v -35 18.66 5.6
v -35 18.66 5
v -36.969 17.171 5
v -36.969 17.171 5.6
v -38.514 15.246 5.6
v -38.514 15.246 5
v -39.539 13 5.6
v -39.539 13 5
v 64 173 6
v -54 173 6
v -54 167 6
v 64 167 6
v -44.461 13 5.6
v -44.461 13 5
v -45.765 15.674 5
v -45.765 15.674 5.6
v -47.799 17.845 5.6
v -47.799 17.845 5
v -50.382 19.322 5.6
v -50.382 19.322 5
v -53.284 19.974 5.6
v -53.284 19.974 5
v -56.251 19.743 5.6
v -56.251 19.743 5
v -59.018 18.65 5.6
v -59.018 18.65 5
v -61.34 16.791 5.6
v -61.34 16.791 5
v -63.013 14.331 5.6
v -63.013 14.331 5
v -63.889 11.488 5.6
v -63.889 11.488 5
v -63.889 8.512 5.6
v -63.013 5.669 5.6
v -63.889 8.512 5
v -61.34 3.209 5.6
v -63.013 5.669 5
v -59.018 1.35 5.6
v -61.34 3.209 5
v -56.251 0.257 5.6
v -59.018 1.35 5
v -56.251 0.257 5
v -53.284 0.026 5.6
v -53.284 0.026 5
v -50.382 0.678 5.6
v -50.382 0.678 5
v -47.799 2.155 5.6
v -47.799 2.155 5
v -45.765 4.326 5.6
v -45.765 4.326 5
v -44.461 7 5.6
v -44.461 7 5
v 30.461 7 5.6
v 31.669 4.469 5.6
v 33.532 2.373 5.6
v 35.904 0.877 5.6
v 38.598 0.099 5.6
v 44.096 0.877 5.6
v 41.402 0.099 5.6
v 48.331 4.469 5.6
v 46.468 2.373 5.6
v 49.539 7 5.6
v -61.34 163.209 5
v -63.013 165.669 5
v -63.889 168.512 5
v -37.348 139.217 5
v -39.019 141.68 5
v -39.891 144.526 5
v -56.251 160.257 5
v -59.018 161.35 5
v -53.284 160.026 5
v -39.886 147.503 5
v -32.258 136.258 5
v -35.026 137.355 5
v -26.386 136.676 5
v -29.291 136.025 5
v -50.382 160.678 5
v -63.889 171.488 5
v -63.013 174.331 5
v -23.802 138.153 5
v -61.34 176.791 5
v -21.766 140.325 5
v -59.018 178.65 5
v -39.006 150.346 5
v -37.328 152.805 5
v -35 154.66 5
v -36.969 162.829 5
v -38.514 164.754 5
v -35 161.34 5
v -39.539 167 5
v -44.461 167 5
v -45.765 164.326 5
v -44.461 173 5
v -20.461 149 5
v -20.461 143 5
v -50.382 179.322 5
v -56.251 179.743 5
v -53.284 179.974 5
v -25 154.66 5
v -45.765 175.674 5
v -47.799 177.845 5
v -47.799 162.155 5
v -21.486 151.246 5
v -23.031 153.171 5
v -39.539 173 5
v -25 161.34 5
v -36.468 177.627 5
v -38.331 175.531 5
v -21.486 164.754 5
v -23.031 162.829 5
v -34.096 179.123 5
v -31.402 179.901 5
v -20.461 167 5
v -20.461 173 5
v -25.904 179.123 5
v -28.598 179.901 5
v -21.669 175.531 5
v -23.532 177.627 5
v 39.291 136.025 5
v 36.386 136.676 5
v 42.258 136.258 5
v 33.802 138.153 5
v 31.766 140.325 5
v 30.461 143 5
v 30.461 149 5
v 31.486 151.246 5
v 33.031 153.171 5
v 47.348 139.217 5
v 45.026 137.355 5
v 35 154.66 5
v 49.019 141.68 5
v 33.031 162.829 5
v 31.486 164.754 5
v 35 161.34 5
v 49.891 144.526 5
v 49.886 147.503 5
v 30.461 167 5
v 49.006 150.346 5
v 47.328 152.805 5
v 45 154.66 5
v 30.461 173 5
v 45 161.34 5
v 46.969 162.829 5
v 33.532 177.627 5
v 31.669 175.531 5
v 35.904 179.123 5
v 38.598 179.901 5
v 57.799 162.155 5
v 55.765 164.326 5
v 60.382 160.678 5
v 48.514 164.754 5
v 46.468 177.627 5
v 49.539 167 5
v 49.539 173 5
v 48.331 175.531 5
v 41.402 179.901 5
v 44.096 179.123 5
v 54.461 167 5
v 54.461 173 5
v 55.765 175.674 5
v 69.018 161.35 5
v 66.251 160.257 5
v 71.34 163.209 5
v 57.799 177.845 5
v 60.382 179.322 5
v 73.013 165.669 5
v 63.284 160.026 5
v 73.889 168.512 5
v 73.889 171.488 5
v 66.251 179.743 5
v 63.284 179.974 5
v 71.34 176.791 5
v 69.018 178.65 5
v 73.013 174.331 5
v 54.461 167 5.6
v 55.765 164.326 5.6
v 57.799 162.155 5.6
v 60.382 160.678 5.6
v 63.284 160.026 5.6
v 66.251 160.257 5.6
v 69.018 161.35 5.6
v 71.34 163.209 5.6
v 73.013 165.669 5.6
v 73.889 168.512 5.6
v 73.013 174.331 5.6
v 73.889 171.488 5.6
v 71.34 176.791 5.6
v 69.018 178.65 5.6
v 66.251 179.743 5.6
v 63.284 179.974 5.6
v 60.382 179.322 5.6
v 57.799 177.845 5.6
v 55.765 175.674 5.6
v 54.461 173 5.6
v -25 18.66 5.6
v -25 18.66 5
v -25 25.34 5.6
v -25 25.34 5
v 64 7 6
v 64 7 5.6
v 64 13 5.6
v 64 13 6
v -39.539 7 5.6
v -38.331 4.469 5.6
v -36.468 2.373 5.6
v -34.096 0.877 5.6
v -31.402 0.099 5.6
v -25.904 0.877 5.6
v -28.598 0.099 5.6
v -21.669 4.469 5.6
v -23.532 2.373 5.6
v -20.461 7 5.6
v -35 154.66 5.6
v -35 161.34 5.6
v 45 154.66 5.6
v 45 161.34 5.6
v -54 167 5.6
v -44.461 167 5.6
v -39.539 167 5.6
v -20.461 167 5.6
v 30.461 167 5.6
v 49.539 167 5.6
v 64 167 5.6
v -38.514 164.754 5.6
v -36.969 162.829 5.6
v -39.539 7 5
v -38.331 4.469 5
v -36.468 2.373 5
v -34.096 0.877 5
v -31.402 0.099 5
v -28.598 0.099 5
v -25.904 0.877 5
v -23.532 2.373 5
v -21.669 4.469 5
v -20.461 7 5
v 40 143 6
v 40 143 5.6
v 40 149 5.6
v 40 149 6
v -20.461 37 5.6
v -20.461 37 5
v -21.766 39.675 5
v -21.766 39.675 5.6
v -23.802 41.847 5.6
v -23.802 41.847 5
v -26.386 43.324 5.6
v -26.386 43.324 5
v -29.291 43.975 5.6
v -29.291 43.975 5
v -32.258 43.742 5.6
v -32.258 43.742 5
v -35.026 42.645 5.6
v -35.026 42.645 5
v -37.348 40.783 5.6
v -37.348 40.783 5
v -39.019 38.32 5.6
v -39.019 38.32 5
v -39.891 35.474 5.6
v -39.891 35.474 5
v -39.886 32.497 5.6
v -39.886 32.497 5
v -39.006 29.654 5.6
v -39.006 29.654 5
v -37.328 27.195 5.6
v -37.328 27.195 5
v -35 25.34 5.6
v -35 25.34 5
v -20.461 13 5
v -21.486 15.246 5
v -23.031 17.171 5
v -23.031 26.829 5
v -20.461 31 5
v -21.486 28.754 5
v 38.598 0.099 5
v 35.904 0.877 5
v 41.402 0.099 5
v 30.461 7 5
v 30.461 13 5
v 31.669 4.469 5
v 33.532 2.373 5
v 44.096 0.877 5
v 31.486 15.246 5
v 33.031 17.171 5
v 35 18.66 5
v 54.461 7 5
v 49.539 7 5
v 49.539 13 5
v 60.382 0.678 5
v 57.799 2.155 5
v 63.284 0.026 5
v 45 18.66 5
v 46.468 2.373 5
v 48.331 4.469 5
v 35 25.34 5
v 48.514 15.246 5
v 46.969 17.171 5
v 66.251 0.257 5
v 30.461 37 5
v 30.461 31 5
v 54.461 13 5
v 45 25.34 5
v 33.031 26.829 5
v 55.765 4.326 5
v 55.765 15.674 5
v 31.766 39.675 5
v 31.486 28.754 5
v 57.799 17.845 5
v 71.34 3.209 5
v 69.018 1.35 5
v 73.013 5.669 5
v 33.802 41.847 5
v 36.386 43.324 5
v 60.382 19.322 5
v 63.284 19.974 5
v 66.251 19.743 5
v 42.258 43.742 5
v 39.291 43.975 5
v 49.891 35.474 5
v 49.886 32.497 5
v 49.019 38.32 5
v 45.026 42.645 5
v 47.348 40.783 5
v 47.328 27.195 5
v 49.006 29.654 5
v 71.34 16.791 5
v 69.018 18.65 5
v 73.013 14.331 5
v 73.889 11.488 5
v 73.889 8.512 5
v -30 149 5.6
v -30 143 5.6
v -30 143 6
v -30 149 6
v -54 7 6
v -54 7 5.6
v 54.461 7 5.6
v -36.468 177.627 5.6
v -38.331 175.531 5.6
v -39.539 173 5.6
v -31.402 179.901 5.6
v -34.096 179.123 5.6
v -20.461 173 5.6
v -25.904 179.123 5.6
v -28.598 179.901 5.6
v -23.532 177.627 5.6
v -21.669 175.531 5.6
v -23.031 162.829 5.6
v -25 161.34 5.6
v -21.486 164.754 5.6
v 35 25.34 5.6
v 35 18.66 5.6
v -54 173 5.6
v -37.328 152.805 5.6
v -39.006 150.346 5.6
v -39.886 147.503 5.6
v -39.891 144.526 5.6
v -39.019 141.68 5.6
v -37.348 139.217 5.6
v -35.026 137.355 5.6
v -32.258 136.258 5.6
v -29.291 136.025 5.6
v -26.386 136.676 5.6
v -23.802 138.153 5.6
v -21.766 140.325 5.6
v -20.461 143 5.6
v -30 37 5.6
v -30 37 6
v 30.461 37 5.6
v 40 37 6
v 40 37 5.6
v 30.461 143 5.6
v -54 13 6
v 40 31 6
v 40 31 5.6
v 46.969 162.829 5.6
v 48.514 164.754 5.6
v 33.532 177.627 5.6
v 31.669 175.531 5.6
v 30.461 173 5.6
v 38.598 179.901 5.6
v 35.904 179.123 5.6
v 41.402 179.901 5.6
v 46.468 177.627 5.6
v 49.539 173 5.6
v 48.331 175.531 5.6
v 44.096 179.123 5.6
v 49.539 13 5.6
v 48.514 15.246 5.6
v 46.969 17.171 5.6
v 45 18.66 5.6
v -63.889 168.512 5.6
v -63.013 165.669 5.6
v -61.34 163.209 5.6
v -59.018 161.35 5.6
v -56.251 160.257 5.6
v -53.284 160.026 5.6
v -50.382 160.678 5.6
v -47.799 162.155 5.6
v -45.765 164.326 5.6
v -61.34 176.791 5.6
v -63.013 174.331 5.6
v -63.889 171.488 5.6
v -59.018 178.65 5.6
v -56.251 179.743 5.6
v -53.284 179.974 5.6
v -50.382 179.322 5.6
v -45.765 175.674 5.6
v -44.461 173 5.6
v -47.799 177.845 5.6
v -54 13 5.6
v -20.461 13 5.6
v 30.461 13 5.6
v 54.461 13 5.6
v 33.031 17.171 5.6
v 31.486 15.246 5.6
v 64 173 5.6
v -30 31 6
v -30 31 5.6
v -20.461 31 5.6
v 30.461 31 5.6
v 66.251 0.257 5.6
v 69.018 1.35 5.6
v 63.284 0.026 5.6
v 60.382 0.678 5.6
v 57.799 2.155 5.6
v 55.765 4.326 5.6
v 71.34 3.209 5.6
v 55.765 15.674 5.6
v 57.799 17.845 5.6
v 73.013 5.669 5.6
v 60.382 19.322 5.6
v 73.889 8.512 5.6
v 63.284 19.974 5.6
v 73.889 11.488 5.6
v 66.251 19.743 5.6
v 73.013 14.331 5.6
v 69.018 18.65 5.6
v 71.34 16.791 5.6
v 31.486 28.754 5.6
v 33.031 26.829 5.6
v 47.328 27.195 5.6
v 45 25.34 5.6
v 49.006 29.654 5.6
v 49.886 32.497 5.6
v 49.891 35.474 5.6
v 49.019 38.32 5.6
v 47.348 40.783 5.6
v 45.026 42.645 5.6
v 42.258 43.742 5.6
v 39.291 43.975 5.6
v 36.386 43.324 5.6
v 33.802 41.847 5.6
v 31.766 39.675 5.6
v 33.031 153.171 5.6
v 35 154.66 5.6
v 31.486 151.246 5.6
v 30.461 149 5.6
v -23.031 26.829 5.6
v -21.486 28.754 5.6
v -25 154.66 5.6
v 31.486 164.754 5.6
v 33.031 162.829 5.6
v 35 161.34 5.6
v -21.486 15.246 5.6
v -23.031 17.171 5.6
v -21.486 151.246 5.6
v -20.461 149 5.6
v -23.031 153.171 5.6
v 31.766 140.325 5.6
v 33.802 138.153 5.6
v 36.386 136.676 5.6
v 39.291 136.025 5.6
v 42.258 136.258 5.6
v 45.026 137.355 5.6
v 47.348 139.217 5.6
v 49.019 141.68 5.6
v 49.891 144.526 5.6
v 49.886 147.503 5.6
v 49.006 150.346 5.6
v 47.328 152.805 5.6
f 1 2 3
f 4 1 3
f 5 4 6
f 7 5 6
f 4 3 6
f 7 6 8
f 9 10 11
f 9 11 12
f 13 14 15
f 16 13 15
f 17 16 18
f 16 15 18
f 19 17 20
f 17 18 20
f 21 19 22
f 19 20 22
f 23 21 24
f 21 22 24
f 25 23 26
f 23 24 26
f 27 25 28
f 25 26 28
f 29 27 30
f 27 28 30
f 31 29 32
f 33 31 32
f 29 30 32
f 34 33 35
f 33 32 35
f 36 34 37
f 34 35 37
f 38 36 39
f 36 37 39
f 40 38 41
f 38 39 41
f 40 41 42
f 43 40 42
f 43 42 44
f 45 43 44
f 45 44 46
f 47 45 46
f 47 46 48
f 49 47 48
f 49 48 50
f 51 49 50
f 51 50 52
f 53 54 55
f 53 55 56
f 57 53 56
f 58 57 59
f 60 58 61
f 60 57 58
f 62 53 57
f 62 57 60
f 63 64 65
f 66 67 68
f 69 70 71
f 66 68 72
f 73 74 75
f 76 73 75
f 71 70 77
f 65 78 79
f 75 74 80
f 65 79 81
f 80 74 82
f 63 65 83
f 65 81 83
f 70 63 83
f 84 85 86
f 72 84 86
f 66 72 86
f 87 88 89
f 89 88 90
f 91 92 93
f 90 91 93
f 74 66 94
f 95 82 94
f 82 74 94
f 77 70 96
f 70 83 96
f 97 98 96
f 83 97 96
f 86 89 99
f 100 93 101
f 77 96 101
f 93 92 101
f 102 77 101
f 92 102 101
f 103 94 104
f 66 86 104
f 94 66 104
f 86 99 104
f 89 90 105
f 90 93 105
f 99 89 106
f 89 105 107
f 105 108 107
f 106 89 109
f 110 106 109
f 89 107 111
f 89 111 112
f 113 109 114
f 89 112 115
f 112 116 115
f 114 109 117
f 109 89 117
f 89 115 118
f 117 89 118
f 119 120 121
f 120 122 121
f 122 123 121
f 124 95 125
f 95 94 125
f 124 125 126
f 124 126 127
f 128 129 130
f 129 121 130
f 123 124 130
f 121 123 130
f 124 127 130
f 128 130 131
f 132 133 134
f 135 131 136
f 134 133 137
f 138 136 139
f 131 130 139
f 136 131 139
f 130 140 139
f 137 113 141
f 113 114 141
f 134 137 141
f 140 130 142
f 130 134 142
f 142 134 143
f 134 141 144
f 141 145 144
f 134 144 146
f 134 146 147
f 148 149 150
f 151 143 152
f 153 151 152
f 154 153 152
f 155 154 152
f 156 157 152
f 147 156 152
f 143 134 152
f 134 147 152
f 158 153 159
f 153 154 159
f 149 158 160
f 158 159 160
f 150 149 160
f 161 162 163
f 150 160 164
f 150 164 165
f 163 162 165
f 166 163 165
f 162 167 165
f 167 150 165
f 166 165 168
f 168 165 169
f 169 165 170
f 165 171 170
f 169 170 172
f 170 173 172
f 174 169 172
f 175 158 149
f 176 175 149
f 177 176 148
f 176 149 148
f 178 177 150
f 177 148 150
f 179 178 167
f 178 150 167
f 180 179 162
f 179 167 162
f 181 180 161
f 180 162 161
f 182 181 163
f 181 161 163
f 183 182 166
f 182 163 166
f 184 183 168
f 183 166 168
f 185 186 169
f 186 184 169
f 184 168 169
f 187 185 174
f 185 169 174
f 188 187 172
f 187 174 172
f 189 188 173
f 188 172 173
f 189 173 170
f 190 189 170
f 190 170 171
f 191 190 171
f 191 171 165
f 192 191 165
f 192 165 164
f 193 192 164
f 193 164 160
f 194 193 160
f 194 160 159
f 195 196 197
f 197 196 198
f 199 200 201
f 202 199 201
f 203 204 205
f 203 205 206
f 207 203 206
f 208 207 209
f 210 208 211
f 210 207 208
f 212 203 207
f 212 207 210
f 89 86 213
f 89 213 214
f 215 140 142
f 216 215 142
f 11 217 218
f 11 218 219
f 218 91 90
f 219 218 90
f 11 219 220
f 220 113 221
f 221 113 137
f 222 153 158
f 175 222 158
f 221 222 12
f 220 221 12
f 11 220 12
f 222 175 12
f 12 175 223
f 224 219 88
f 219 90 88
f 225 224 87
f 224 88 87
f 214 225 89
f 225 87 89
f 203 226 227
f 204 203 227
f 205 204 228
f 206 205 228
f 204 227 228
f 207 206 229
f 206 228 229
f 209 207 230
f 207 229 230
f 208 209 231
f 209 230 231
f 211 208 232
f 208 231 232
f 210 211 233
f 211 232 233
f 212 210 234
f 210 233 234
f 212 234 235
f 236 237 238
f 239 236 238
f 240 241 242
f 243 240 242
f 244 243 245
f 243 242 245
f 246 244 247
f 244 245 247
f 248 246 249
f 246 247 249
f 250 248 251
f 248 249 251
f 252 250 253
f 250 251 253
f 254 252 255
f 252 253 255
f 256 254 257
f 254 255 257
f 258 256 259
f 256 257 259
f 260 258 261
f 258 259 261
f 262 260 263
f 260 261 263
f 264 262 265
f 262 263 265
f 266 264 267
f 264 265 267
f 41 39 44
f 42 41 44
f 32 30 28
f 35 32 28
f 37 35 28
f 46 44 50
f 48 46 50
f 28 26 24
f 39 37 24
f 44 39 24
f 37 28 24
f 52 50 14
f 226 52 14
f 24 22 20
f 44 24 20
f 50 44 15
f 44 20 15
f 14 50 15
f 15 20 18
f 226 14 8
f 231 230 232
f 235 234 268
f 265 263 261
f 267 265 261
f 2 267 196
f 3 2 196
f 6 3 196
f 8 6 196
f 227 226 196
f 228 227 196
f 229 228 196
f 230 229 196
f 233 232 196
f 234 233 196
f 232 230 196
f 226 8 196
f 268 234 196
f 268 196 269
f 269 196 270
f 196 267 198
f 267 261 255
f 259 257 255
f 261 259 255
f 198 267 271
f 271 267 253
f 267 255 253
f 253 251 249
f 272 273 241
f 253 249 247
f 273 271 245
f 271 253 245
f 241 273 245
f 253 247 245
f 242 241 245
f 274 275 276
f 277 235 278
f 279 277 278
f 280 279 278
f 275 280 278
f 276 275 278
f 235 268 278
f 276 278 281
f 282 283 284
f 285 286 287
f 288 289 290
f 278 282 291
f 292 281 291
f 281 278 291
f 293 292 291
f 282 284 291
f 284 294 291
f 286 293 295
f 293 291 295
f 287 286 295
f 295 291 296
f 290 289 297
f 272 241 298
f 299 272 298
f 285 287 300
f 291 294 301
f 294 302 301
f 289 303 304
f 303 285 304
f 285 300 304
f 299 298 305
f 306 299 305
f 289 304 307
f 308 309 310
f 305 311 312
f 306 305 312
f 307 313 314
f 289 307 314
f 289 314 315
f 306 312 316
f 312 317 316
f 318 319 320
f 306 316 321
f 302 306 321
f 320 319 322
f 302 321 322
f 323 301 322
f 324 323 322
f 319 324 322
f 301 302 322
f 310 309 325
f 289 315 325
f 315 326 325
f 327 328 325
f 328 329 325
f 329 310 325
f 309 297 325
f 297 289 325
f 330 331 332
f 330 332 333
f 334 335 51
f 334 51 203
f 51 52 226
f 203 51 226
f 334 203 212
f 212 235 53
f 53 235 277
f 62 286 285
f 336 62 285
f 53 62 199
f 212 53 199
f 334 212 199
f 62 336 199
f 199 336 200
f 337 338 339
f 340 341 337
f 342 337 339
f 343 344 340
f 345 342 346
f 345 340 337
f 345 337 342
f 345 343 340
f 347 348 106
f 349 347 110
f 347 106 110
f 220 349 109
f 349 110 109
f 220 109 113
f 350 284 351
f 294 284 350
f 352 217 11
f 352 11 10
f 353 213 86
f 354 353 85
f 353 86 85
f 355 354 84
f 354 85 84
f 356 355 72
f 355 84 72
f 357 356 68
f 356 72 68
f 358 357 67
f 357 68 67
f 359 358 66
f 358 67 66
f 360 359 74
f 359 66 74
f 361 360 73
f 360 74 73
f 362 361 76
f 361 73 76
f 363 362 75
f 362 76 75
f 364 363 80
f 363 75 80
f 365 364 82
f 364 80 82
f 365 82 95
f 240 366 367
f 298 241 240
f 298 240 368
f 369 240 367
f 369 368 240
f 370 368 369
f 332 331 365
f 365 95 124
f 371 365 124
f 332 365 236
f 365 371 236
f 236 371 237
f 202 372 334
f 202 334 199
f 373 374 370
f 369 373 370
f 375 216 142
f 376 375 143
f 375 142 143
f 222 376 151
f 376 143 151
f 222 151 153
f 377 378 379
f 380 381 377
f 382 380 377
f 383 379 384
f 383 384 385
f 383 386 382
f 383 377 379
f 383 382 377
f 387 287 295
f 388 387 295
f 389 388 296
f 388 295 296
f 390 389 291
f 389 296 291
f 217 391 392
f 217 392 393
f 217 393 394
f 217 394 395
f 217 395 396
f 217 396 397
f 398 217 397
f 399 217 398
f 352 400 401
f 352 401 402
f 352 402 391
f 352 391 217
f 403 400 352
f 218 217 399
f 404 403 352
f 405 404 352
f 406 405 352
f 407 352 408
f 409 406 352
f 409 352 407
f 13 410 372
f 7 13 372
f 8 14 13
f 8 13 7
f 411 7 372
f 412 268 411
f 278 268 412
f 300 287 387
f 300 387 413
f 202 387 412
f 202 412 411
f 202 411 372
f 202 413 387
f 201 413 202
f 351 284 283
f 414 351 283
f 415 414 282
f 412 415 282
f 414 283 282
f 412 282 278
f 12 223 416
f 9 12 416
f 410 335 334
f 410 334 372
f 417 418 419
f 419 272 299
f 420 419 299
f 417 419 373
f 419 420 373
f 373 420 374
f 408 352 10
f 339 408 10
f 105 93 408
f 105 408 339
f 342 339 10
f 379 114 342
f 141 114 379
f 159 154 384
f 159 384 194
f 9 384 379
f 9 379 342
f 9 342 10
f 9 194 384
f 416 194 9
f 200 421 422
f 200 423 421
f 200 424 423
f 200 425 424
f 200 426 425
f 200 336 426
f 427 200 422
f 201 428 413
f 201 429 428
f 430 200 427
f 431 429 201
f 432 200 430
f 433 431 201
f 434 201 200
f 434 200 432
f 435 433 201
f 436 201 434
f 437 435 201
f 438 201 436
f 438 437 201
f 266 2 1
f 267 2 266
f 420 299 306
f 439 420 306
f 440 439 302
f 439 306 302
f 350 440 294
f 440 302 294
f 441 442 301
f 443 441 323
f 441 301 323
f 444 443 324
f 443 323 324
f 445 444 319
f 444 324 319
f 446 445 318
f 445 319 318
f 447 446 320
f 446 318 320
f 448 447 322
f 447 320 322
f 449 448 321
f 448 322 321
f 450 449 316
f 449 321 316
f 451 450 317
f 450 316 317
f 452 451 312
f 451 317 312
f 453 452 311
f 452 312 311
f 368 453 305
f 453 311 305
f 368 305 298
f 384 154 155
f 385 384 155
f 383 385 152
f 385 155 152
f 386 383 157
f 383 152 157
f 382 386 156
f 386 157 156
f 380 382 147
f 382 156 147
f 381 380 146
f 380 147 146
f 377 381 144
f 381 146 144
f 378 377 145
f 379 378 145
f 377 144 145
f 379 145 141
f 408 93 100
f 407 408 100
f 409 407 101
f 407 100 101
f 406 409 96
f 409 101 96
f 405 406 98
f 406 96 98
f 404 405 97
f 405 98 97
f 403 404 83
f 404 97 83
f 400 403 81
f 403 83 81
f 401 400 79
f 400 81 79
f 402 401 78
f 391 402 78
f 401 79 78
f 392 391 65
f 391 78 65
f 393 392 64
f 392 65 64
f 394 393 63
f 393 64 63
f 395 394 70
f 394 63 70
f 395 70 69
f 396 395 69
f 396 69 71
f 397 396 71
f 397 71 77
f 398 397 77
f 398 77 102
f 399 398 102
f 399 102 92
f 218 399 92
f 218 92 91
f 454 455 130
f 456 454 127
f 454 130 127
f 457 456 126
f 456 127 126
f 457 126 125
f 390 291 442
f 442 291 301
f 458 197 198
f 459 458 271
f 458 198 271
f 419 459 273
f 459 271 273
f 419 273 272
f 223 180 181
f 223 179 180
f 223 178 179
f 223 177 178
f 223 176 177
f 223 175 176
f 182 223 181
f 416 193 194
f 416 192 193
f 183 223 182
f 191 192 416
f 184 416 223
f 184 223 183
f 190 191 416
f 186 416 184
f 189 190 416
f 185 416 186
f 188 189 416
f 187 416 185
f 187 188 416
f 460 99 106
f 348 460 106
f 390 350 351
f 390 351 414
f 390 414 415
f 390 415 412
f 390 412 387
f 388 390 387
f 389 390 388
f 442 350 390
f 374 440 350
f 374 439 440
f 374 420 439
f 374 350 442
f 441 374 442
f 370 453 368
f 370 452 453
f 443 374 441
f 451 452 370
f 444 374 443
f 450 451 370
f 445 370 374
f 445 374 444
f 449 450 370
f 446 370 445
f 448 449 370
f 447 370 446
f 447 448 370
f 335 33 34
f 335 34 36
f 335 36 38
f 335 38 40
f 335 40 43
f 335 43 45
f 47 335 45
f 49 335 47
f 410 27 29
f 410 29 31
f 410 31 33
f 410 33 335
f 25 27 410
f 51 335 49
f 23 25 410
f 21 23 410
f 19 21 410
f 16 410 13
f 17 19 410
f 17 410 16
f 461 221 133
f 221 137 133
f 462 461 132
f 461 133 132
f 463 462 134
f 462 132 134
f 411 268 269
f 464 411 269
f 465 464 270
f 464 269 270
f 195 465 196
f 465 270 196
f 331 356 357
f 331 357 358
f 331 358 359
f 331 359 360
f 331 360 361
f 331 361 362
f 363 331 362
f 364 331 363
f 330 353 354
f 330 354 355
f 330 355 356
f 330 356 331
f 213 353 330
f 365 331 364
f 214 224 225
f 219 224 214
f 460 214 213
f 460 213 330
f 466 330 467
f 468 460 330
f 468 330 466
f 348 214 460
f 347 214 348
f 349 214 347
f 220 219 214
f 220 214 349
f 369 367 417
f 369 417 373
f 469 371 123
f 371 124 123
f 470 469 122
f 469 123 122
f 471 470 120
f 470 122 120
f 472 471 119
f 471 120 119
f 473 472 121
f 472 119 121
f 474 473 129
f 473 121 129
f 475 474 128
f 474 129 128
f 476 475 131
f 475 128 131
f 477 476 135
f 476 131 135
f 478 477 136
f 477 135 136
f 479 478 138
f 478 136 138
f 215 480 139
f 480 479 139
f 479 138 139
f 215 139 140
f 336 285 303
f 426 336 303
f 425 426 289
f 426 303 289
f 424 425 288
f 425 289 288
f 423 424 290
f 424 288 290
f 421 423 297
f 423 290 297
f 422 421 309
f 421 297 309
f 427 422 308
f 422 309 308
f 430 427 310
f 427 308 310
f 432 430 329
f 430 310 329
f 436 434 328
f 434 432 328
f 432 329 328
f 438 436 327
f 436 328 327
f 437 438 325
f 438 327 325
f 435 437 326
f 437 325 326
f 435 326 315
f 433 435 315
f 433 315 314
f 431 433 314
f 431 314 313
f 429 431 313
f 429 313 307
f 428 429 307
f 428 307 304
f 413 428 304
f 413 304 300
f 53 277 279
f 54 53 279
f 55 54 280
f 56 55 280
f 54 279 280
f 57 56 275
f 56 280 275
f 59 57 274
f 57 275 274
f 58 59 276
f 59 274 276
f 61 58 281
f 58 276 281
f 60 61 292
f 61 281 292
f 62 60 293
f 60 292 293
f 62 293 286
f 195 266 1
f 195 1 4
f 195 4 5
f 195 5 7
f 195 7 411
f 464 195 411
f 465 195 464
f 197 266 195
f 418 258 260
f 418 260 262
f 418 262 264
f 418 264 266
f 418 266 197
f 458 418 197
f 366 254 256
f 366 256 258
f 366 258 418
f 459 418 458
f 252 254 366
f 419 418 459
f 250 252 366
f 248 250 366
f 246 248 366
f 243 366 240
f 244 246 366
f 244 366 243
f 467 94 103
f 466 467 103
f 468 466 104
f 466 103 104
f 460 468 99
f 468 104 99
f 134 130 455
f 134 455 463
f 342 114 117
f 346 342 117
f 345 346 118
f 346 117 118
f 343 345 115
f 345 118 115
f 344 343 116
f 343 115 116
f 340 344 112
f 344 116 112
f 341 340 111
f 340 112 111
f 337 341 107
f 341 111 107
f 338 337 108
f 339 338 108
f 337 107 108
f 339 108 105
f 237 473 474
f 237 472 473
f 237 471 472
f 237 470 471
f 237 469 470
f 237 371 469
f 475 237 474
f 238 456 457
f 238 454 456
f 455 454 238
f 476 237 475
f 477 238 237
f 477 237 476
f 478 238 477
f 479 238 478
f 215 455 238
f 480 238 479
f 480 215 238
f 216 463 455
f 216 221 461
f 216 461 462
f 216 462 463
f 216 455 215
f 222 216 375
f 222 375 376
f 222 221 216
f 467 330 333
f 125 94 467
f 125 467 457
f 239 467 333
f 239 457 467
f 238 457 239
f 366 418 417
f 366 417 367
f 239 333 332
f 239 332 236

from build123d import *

# Parameters (mm, degrees)
CYLINDER018_R     = 10
CYLINDER018_DEPTH = 0.6
CYLINDER019_R     = 10
CYLINDER019_DEPTH = 0.6
CYLINDER020_R     = 10
CYLINDER020_DEPTH = 0.6
BOX015_W          = 70
BOX015_H          = 6
BOX015_DEPTH      = 1
BOX016_W          = 70
BOX016_H          = 6
BOX016_DEPTH      = 1
CYLINDER025_R     = 10
CYLINDER025_DEPTH = 0.6
CYLINDER026_R     = 10
CYLINDER026_DEPTH = 0.6
CYLINDER027_R     = 10
CYLINDER027_DEPTH = 0.6
CYLINDER028_R     = 10
CYLINDER028_DEPTH = 0.6
CYLINDER029_R     = 10
CYLINDER029_DEPTH = 0.6
CYLINDER030_R     = 10
CYLINDER030_DEPTH = 0.6
CYLINDER031_R     = 10
CYLINDER031_DEPTH = 0.6
CYLINDER032_R     = 10
CYLINDER032_DEPTH = 0.6
BOX019_W          = 118
BOX019_H          = 6
BOX019_DEPTH      = 1
BOX020_W          = 118
BOX020_H          = 6
BOX020_DEPTH      = 1
BOX021_W          = 10
BOX021_H          = 10
BOX021_DEPTH      = 0.6
BOX022_W          = 10
BOX022_H          = 10
BOX022_DEPTH      = 0.6
BOX023_W          = 10
BOX023_H          = 10
BOX023_DEPTH      = 0.6
BOX024_W          = 10
BOX024_H          = 10
BOX024_DEPTH      = 0.6
CYLINDER017_R     = 10
CYLINDER017_DEPTH = 0.6


with BuildPart() as cylinder018:
    # Cylinder018 → Cylinder018 (new body)
    with BuildSketch(Plane(origin=(64, 10, 5), x_dir=(1, 0, 0), z_dir=(0, 0, 1))):
        Circle(CYLINDER018_R)
    extrude(amount=CYLINDER018_DEPTH)


with BuildPart() as cylinder019:
    # Cylinder019 → Cylinder019 (new body)
    with BuildSketch(Plane(origin=(-54, 170, 5), x_dir=(1, 0, 0), z_dir=(0, 0, 1))):
        Circle(CYLINDER019_R)
    extrude(amount=CYLINDER019_DEPTH)


with BuildPart() as cylinder020:
    # Cylinder020 → Cylinder020 (new body)
    with BuildSketch(Plane(origin=(40, 146, 5), x_dir=(1, 0, 0), z_dir=(0, 0, 1))):
        Circle(CYLINDER020_R)
    extrude(amount=CYLINDER020_DEPTH)


with BuildPart() as cube015:
    # Box015 → Box015 (new body)
    with BuildSketch(Plane(origin=(-30, 31, 5), x_dir=(1, 0, 0), z_dir=(0, 0, 1))):
        with Locations((35, 3)):
            Rectangle(BOX015_W, BOX015_H)
    extrude(amount=BOX015_DEPTH)


with BuildPart() as cube016:
    # Box016 → Box016 (new body)
    with BuildSketch(Plane(origin=(-30, 143, 5), x_dir=(1, 0, 0), z_dir=(0, 0, 1))):
        with Locations((35, 3)):
            Rectangle(BOX016_W, BOX016_H)
    extrude(amount=BOX016_DEPTH)


with BuildPart() as cylinder025:
    # Cylinder025 → Cylinder025 (new body)
    with BuildSketch(Plane(origin=(40, 34, 5), x_dir=(1, 0, 0), z_dir=(0, 0, 1))):
        Circle(CYLINDER025_R)
    extrude(amount=CYLINDER025_DEPTH)


with BuildPart() as cylinder026:
    # Cylinder026 → Cylinder026 (new body)
    with BuildSketch(Plane(origin=(-30, 34, 5), x_dir=(1, 0, 0), z_dir=(0, 0, 1))):
        Circle(CYLINDER026_R)
    extrude(amount=CYLINDER026_DEPTH)


with BuildPart() as cylinder027:
    # Cylinder027 → Cylinder027 (new body)
    with BuildSketch(Plane(origin=(-30, 146, 5), x_dir=(1, 0, 0), z_dir=(0, 0, 1))):
        Circle(CYLINDER027_R)
    extrude(amount=CYLINDER027_DEPTH)


with BuildPart() as cylinder028:
    # Cylinder028 → Cylinder028 (new body)
    with BuildSketch(Plane(origin=(64, 170, 5), x_dir=(1, 0, 0), z_dir=(0, 0, 1))):
        Circle(CYLINDER028_R)
    extrude(amount=CYLINDER028_DEPTH)


with BuildPart() as cylinder029:
    # Cylinder029 → Cylinder029 (new body)
    with BuildSketch(Plane(origin=(40, 170, 5), x_dir=(1, 0, 0), z_dir=(0, 0, 1))):
        Circle(CYLINDER029_R)
    extrude(amount=CYLINDER029_DEPTH)


with BuildPart() as cylinder030:
    # Cylinder030 → Cylinder030 (new body)
    with BuildSketch(Plane(origin=(-30, 170, 5), x_dir=(1, 0, 0), z_dir=(0, 0, 1))):
        Circle(CYLINDER030_R)
    extrude(amount=CYLINDER030_DEPTH)


with BuildPart() as cylinder031:
    # Cylinder031 → Cylinder031 (new body)
    with BuildSketch(Plane(origin=(-30, 10, 5), x_dir=(1, 0, 0), z_dir=(0, 0, 1))):
        Circle(CYLINDER031_R)
    extrude(amount=CYLINDER031_DEPTH)


with BuildPart() as cylinder032:
    # Cylinder032 → Cylinder032 (new body)
    with BuildSketch(Plane(origin=(40, 10, 5), x_dir=(1, 0, 0), z_dir=(0, 0, 1))):
        Circle(CYLINDER032_R)
    extrude(amount=CYLINDER032_DEPTH)


with BuildPart() as cube019:
    # Box019 → Box019 (new body)
    with BuildSketch(Plane(origin=(-54, 7, 5), x_dir=(1, 0, 0), z_dir=(0, 0, 1))):
        with Locations((59, 3)):
            Rectangle(BOX019_W, BOX019_H)
    extrude(amount=BOX019_DEPTH)


with BuildPart() as cube020:
    # Box020 → Box020 (new body)
    with BuildSketch(Plane(origin=(-54, 167, 5), x_dir=(1, 0, 0), z_dir=(0, 0, 1))):
        with Locations((59, 3)):
            Rectangle(BOX020_W, BOX020_H)
    extrude(amount=BOX020_DEPTH)


with BuildPart() as cube021:
    # Box021 → Box021 (new body)
    with BuildSketch(Plane(origin=(-35, 17, 5), x_dir=(1, 0, 0), z_dir=(0, 0, 1))):
        with Locations((5, 5)):
            Rectangle(BOX021_W, BOX021_H)
    extrude(amount=BOX021_DEPTH)


with BuildPart() as cube022:
    # Box022 → Box022 (new body)
    with BuildSketch(Plane(origin=(35, 17, 5), x_dir=(1, 0, 0), z_dir=(0, 0, 1))):
        with Locations((5, 5)):
            Rectangle(BOX022_W, BOX022_H)
    extrude(amount=BOX022_DEPTH)


with BuildPart() as cube023:
    # Box023 → Box023 (new body)
    with BuildSketch(Plane(origin=(35, 153, 5), x_dir=(1, 0, 0), z_dir=(0, 0, 1))):
        with Locations((5, 5)):
            Rectangle(BOX023_W, BOX023_H)
    extrude(amount=BOX023_DEPTH)


with BuildPart() as cube024:
    # Box024 → Box024 (new body)
    with BuildSketch(Plane(origin=(-35, 153, 5), x_dir=(1, 0, 0), z_dir=(0, 0, 1))):
        with Locations((5, 5)):
            Rectangle(BOX024_W, BOX024_H)
    extrude(amount=BOX024_DEPTH)


with BuildPart() as fusion017:
    # Cylinder017 → Cylinder017 (new body)
    with BuildSketch(Plane(origin=(-54, 10, 5), x_dir=(1, 0, 0), z_dir=(0, 0, 1))):
        Circle(CYLINDER017_R)
    extrude(amount=CYLINDER017_DEPTH)

    # Fusion017: union Cylinder018, Cylinder019, Cylinder020, Cube015, Cube016, Cylinder025, Cylinder026, Cylinder027, Cylinder028, Cylinder029, Cylinder030, Cylinder031, Cylinder032, Cube019, Cube020, Cube021, Cube022, Cube023, Cube024
    add(cylinder018.part)
    add(cylinder019.part)
    add(cylinder020.part)
    add(cube015.part)
    add(cube016.part)
    add(cylinder025.part)
    add(cylinder026.part)
    add(cylinder027.part)
    add(cylinder028.part)
    add(cylinder029.part)
    add(cylinder030.part)
    add(cylinder031.part)
    add(cylinder032.part)
    add(cube019.part)
    add(cube020.part)
    add(cube021.part)
    add(cube022.part)
    add(cube023.part)
    add(cube024.part)


solid = fusion017.part
